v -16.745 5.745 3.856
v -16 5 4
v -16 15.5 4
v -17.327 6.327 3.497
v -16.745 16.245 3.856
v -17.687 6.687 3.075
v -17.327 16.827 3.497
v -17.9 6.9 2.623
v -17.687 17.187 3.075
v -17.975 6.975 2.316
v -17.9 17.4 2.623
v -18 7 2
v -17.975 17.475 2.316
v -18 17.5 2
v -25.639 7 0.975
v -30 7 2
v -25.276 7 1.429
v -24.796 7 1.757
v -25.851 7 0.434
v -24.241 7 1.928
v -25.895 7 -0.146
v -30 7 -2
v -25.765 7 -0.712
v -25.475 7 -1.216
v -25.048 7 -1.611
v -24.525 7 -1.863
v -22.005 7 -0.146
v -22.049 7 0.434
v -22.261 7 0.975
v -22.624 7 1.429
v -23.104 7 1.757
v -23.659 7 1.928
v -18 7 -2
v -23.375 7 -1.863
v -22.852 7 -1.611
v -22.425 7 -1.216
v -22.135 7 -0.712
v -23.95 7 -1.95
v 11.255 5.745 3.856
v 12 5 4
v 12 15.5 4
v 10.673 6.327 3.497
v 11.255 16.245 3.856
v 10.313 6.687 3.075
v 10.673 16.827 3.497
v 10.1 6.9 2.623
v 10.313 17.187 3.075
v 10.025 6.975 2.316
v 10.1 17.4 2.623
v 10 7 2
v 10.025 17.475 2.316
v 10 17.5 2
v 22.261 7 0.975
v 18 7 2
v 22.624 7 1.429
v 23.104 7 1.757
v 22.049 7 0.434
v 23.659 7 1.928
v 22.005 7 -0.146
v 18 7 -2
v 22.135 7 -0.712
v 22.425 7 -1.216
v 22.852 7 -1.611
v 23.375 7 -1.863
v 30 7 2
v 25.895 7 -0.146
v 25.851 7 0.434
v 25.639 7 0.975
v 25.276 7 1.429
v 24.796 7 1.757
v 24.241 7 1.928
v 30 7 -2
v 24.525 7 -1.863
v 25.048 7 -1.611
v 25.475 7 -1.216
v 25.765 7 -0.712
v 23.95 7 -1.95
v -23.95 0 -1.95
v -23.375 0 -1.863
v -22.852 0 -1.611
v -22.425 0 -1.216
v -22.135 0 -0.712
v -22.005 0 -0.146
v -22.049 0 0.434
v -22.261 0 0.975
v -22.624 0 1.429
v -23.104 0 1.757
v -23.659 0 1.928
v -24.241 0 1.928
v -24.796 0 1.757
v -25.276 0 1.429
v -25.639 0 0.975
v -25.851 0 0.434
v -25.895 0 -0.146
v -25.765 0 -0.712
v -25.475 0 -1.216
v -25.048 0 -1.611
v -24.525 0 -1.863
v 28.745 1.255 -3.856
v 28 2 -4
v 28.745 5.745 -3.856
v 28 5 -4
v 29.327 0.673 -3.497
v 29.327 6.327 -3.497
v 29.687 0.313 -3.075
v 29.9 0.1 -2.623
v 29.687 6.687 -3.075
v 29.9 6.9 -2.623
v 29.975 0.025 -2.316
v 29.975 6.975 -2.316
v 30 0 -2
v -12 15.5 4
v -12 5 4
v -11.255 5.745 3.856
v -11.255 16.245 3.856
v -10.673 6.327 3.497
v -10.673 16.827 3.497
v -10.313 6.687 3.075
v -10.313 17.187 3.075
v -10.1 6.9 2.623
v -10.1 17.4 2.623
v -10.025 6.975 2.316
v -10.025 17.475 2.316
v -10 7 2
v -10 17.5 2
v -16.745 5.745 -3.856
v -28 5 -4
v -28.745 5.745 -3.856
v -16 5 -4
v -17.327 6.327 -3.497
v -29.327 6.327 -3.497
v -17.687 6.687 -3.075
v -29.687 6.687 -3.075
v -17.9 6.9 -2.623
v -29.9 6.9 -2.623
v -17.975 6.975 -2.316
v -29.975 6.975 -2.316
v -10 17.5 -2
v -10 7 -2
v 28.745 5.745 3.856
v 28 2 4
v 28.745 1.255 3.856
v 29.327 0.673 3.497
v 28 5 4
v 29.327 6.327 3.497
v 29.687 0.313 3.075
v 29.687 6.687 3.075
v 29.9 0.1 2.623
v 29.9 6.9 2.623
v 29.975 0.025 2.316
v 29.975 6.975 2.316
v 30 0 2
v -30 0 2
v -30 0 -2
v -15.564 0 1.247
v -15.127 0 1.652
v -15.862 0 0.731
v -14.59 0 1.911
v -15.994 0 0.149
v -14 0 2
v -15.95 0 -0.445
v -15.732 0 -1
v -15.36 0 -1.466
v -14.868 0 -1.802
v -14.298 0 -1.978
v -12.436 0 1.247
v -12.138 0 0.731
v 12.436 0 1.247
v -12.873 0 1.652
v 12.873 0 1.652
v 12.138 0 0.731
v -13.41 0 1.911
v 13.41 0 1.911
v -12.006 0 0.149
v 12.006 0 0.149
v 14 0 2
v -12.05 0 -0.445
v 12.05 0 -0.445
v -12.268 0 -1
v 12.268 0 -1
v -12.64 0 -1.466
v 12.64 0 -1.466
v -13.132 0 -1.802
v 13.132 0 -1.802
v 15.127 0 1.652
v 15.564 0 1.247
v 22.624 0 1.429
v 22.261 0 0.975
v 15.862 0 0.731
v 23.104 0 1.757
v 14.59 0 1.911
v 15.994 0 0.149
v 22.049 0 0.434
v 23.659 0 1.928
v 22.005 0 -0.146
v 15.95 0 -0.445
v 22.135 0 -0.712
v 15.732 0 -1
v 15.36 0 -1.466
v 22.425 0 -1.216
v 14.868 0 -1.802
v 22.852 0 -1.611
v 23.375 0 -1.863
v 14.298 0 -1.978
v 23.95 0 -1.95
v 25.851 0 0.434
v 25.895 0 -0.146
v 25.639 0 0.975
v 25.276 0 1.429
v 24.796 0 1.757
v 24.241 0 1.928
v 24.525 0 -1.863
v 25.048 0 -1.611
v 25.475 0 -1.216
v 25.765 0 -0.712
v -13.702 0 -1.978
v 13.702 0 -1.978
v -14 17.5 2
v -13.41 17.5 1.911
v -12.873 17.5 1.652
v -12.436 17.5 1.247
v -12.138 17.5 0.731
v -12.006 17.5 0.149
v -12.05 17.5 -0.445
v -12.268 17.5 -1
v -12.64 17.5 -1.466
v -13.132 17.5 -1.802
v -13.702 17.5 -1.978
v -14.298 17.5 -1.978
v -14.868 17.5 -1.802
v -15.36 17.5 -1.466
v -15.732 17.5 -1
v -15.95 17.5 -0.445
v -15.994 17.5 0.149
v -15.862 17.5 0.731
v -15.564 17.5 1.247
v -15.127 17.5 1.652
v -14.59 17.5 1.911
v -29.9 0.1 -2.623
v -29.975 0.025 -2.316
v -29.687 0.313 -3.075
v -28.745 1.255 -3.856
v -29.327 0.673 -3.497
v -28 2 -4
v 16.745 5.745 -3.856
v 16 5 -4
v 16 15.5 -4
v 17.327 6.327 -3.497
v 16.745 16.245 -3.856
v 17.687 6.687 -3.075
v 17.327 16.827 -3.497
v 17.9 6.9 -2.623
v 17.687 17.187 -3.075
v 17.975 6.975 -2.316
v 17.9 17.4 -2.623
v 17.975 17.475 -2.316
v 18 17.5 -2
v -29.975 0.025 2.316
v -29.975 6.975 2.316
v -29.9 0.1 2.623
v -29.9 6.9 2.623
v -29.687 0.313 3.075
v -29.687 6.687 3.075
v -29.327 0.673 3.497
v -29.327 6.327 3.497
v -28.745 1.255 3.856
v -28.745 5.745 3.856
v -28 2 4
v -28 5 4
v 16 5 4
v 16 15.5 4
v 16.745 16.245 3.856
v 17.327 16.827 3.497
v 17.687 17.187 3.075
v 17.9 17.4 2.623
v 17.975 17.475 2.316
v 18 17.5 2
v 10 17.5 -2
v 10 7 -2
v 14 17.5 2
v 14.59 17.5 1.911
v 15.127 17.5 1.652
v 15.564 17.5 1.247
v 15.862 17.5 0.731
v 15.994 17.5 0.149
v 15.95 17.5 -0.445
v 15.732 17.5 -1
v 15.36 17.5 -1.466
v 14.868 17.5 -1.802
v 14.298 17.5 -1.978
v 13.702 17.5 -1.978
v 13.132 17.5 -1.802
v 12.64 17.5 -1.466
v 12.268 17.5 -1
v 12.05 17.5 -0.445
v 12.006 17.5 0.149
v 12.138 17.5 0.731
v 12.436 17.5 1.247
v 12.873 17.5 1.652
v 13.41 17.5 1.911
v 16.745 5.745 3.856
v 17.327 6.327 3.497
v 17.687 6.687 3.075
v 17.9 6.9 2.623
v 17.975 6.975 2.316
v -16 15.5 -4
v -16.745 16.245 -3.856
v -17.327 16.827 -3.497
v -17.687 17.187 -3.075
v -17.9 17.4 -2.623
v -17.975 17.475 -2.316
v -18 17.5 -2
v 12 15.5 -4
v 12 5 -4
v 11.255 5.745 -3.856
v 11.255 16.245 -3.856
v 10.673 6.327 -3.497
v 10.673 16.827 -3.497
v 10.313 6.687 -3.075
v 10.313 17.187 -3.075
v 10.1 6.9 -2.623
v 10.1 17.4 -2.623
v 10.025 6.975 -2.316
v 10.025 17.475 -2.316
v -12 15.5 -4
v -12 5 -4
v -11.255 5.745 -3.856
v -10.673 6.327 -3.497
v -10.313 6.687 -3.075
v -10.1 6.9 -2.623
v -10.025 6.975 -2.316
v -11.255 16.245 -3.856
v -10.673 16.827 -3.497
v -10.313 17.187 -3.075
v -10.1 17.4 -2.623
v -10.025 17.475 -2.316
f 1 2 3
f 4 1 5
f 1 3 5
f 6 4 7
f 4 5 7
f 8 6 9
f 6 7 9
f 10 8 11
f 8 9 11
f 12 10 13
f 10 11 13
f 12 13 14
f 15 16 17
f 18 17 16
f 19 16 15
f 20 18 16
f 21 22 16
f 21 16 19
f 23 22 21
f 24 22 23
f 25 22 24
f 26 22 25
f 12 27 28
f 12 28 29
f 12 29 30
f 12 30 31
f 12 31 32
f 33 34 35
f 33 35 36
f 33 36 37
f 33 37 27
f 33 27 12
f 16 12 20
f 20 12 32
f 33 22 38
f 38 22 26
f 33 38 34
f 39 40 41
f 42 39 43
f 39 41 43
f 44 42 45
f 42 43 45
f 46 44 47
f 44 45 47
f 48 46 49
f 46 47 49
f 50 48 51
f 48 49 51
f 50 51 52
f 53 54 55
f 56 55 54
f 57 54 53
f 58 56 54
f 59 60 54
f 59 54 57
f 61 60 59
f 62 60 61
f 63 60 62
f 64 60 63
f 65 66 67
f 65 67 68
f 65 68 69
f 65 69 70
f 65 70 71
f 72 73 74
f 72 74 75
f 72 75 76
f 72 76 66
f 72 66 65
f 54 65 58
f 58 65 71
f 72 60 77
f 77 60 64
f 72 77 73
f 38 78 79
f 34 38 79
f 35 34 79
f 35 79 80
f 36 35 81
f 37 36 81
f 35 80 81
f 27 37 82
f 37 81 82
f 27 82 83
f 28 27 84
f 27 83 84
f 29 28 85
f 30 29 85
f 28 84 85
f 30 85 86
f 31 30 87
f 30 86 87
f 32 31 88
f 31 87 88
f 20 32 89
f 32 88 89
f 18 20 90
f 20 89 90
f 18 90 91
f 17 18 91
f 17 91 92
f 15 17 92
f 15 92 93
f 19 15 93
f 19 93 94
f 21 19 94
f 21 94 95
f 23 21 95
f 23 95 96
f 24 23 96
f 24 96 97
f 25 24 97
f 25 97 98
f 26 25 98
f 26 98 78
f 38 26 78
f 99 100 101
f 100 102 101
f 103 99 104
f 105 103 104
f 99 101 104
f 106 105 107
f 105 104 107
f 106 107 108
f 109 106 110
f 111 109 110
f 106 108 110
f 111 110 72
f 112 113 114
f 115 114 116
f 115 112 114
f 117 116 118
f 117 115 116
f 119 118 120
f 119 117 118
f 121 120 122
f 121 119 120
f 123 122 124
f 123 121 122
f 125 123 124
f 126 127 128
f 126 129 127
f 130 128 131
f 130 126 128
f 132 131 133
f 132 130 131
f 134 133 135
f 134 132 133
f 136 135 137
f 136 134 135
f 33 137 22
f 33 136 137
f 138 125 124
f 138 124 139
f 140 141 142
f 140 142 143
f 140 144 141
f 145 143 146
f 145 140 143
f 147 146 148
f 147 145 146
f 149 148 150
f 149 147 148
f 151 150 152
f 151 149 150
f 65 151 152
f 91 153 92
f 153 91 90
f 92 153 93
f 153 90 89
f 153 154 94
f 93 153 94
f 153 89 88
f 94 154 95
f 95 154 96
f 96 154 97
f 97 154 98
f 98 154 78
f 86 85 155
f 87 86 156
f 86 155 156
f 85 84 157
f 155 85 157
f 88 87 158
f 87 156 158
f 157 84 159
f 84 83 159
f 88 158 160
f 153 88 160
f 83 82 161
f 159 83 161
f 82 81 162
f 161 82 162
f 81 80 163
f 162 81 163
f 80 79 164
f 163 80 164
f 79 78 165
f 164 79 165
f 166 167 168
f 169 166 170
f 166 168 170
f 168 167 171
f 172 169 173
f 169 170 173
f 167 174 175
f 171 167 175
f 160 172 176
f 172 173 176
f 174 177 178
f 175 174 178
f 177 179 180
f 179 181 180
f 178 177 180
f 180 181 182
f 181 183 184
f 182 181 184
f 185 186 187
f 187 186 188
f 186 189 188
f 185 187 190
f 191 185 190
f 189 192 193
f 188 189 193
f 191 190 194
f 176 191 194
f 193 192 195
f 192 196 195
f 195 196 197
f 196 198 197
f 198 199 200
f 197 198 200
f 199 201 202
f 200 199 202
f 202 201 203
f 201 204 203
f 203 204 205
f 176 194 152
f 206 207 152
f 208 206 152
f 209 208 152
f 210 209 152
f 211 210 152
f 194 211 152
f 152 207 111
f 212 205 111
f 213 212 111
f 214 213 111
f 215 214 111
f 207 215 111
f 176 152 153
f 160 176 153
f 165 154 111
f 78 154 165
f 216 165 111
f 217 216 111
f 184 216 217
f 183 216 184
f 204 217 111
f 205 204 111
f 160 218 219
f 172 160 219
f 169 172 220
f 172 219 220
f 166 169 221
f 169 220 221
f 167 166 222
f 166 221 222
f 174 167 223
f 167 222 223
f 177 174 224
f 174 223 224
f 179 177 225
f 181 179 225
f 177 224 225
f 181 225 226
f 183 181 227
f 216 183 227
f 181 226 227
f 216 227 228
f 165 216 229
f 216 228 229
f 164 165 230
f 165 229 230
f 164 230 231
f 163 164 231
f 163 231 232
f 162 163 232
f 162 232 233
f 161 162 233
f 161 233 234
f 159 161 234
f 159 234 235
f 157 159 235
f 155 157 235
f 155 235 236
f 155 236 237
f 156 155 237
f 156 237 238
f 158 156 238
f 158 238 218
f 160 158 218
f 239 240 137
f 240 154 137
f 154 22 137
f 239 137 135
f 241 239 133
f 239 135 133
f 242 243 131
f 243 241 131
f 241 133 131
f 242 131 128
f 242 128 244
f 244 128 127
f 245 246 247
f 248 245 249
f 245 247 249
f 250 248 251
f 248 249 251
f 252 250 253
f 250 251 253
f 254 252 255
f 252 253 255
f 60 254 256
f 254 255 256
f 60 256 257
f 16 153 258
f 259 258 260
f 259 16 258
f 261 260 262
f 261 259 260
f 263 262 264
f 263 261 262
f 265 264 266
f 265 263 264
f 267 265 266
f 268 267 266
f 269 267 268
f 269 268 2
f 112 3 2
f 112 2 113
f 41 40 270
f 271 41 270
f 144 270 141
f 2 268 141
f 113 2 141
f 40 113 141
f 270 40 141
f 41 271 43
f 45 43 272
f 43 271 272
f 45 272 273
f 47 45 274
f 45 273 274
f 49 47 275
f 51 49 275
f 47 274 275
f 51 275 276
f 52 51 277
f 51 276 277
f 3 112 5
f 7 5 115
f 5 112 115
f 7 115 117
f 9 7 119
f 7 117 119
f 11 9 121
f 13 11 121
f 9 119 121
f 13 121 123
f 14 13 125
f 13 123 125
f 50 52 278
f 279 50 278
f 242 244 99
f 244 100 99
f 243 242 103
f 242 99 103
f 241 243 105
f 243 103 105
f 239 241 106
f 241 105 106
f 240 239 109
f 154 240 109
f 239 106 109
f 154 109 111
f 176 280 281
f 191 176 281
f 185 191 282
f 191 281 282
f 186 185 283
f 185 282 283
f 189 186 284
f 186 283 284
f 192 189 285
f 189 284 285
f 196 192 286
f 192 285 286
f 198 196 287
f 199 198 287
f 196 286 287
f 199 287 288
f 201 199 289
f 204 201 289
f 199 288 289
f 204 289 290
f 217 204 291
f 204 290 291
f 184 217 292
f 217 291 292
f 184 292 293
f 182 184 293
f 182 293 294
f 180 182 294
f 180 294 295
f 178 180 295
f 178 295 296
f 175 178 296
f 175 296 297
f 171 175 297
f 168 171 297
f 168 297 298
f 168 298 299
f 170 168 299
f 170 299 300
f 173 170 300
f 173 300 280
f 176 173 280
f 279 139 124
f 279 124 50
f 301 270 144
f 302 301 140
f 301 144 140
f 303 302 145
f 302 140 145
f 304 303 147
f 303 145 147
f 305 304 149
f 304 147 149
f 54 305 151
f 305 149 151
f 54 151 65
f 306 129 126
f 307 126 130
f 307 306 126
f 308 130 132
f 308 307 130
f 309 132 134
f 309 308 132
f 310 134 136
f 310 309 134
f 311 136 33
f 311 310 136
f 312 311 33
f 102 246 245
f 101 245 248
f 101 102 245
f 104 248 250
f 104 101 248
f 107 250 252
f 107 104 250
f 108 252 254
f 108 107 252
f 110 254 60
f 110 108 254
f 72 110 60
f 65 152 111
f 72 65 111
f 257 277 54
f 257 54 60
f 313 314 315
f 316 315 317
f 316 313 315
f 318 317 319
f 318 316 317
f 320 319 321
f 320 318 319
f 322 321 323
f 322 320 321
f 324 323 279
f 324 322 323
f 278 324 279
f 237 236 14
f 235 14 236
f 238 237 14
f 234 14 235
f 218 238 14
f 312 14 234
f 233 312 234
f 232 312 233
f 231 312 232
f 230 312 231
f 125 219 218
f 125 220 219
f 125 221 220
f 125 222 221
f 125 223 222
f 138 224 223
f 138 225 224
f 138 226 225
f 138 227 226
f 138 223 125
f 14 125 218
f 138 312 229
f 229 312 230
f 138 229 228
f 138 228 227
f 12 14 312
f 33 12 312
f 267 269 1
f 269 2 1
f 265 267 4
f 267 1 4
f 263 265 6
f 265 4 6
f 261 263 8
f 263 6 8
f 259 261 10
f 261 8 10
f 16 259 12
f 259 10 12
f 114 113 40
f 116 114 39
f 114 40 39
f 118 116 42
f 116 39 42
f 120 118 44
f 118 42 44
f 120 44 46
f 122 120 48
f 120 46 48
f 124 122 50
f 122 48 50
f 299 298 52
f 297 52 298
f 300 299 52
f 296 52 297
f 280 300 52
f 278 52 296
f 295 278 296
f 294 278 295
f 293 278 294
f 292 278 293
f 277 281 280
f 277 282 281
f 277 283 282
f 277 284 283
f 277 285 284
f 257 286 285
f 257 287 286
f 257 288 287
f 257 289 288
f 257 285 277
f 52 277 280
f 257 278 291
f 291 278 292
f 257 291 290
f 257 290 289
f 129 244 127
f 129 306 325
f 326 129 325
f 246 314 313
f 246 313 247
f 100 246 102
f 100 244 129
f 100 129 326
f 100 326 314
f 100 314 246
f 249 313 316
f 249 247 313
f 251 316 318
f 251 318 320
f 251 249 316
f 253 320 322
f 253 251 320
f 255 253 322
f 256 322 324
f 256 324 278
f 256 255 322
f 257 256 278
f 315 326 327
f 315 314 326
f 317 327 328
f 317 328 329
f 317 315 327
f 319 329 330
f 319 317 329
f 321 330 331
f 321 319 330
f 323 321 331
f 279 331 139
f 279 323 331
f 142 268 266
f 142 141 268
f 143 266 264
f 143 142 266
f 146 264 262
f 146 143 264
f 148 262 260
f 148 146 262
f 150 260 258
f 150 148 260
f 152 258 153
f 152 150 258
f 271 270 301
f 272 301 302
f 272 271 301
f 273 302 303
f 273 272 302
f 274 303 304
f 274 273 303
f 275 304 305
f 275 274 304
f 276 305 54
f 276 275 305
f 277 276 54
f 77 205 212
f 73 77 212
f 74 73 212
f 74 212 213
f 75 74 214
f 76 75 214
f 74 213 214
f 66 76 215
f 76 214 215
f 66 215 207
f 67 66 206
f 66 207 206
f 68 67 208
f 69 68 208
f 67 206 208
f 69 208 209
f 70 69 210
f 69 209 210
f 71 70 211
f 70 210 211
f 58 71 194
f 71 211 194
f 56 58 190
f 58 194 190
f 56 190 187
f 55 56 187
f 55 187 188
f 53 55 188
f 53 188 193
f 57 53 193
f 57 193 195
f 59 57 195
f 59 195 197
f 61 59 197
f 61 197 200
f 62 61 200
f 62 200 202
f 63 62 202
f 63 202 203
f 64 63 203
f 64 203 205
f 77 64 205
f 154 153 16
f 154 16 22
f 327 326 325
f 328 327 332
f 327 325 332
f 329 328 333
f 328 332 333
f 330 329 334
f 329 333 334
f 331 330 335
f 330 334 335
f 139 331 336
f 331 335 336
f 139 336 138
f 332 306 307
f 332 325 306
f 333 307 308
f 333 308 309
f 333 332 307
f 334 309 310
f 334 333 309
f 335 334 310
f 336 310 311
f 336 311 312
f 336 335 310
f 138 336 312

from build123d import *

# Parameters (mm, degrees)
SKETCH1_W           = 60
SKETCH1_H           = 8
BOSS_EXTRUDE1_DEPTH = 7
SKETCH2_W           = 8
SKETCH2_H           = 8
BOSS_EXTRUDE2_DEPTH = 10.5
SKETCH3_R           = 2
CUT_EXTRUDE1_DEPTH  = 35.960692213
SKETCH5_R           = 1.95
CUT_EXTRUDE2_DEPTH  = 35.960692213
FILLET1_R           = 2


with BuildPart() as part:
    # Sketch1 → Boss-Extrude1 (new body)
    with BuildSketch(Plane(origin=(0, 0, 0), x_dir=(1, 0, 0), z_dir=(0, 1, 0))):
        Rectangle(SKETCH1_W, SKETCH1_H)
    extrude(amount=BOSS_EXTRUDE1_DEPTH)

    # Sketch2 → Boss-Extrude2 (add)
    with BuildSketch(Plane(origin=(0, 7, 0), x_dir=(1, 0, 0), z_dir=(0, 1, 0))):
        with Locations((-14, 0)):
            Rectangle(SKETCH2_W, SKETCH2_H)
        with Locations((14, 0)):
            Rectangle(SKETCH2_W, SKETCH2_H)
    extrude(amount=BOSS_EXTRUDE2_DEPTH)

    # Sketch3 → Cut-Extrude1 (cut, through all)
    with BuildSketch(Plane(origin=(0, 17.5, 0), x_dir=(1, 0, 0), z_dir=(0, 1, 0))):
        with Locations((-14, 0)):
            Circle(SKETCH3_R)
        with Locations((14, 0)):
            Circle(SKETCH3_R)
    extrude(amount=-CUT_EXTRUDE1_DEPTH, mode=Mode.SUBTRACT)

    # Sketch5 → Cut-Extrude2 (cut, through all)
    with BuildSketch(Plane.XZ):
        with Locations((-23.95, 0)):
            Circle(SKETCH5_R)
        with Locations((23.95, 0)):
            Circle(SKETCH5_R)
    extrude(amount=-CUT_EXTRUDE2_DEPTH, mode=Mode.SUBTRACT)

    # Fillet1
    fillet1_edges = [part.edges().sort_by_distance(p)[0] for p in [
        (30, 3.5, -4),
        (24, 7, -4),
        (18, 12.25, -4),
        (14, 17.5, -4),
        (10, 12.25, -4),
        (0, 7, -4),
        (-10, 12.25, -4),
        (-14, 17.5, -4),
        (-18, 12.25, -4),
        (-24, 7, -4),
        (-30, 3.5, -4),
        (0, 0, -4),
        (-30, 3.5, 4),
        (-24, 7, 4),
        (-18, 12.25, 4),
        (-14, 17.5, 4),
        (-10, 12.25, 4),
        (0, 7, 4),
        (10, 12.25, 4),
        (14, 17.5, 4),
        (18, 12.25, 4),
        (24, 7, 4),
        (30, 3.5, 4),
        (0, 0, 4),
    ]]
    fillet(fillet1_edges, radius=FILLET1_R)


solid = part.part
